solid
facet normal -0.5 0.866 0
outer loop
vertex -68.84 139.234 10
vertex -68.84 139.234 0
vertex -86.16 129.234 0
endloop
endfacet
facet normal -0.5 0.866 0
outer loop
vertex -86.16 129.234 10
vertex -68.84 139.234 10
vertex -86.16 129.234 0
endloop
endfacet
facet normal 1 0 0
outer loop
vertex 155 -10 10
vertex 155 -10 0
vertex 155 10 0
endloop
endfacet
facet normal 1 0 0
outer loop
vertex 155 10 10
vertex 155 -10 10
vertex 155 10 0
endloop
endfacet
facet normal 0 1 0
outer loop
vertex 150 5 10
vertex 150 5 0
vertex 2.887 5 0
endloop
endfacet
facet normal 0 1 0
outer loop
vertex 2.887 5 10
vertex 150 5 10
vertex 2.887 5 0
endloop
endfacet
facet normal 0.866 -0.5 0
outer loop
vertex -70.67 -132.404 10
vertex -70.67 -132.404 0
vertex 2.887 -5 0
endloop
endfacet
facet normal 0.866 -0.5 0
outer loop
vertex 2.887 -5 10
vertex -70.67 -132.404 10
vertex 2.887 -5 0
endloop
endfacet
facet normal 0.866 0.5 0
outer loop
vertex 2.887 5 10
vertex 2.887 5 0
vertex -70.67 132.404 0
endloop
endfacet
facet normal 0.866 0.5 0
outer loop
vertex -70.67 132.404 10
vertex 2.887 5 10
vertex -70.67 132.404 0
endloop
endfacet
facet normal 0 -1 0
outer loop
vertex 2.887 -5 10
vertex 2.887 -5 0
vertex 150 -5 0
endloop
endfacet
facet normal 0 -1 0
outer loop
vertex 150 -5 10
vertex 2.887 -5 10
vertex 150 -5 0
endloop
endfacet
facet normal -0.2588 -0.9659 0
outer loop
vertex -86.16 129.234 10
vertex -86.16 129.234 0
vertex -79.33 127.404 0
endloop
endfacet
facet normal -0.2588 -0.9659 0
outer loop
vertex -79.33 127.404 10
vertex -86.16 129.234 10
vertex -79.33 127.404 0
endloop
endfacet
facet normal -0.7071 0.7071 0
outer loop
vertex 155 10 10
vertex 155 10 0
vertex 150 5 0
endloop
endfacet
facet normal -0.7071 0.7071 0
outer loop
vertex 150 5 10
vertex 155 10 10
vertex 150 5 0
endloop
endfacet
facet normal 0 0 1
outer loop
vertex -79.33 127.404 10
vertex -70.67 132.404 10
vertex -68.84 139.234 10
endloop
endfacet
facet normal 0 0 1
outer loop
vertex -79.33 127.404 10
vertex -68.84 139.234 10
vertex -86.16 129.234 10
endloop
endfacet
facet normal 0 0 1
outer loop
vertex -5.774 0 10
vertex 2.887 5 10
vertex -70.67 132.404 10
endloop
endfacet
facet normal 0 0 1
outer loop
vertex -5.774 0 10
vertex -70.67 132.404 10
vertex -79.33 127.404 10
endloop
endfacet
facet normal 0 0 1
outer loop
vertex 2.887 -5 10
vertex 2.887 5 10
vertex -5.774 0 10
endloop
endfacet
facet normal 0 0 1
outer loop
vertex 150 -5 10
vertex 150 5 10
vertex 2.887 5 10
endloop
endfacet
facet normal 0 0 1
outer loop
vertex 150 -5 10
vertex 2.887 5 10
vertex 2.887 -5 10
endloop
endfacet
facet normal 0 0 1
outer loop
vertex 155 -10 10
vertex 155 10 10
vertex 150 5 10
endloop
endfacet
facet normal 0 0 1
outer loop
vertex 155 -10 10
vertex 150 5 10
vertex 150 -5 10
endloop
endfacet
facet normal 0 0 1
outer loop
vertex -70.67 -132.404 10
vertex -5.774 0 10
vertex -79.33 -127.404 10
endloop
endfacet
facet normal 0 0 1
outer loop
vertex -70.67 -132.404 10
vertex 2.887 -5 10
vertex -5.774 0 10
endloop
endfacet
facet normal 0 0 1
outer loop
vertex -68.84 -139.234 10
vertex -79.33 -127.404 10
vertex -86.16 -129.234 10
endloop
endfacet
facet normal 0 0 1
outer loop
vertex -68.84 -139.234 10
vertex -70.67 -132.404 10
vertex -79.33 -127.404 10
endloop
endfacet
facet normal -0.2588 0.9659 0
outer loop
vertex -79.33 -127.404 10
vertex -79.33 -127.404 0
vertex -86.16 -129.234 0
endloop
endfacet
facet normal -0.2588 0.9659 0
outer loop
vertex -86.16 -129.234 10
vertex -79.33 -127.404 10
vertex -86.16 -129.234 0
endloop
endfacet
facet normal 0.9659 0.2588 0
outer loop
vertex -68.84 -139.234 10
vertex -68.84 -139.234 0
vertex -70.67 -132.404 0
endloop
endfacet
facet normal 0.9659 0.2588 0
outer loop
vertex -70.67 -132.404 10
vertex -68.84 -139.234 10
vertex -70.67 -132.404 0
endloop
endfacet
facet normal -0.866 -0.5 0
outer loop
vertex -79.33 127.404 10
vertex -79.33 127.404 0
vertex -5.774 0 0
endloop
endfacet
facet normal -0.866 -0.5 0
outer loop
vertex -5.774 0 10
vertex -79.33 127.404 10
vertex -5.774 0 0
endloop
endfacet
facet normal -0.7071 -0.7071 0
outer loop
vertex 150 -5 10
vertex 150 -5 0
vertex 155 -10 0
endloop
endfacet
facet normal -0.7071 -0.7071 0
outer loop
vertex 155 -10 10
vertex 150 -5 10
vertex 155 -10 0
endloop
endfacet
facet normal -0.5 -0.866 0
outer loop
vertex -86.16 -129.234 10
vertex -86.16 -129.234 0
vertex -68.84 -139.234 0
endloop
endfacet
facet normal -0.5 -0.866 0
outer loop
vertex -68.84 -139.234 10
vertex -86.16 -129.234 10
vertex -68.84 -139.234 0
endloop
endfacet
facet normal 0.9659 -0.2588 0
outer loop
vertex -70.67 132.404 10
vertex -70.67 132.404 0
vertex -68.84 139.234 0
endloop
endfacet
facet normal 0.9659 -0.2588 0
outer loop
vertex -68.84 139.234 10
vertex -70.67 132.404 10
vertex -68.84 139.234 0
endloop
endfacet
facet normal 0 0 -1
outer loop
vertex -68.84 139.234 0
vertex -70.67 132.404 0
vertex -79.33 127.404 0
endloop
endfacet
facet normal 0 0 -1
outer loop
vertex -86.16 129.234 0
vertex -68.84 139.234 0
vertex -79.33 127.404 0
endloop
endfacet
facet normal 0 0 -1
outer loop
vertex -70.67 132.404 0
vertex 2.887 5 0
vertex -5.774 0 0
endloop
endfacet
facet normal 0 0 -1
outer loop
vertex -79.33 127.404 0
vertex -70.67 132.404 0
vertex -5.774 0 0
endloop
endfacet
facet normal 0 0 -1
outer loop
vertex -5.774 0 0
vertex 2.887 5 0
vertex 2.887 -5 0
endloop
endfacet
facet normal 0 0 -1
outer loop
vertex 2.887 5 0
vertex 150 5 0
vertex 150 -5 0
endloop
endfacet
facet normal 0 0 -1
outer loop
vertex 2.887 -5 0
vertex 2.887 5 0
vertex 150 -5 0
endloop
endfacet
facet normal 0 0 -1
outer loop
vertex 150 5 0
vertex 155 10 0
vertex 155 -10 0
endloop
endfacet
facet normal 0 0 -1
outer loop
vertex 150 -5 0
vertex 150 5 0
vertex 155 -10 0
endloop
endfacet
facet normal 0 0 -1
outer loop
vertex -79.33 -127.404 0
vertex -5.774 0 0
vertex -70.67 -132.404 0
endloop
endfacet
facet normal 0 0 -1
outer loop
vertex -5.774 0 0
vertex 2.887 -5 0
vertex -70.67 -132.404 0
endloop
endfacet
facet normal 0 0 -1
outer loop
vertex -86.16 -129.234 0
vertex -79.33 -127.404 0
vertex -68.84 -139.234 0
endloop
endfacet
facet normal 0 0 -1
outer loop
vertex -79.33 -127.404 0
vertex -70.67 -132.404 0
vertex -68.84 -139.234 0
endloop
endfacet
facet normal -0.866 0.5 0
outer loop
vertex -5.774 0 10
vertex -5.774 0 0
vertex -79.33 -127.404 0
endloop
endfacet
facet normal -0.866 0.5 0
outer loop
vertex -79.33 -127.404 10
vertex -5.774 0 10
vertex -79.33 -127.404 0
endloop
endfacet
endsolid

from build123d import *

# Parameters (mm, degrees)
BOSS_EXTRUDE1_DEPTH = 10
CIRPATTERN1_COUNT   = 3


with BuildPart() as part:
    # Sketch1 → Boss-Extrude1 (new body)
    with BuildSketch(Plane.XY):
        Polygon((155, 10), (150, 5), (0, 5), (0, -5), (150, -5), (155, -10), align=None)
    boss_extrude1 = extrude(amount=BOSS_EXTRUDE1_DEPTH)

    # CirPattern1: Boss-Extrude1 ×3 about axis
    cirpattern1_axis = Axis((0, 0, 0), (0, 0, 1))
    for i in range(1, CIRPATTERN1_COUNT):
        add(boss_extrude1.rotate(cirpattern1_axis, i * 360 / CIRPATTERN1_COUNT))


solid = part.part
